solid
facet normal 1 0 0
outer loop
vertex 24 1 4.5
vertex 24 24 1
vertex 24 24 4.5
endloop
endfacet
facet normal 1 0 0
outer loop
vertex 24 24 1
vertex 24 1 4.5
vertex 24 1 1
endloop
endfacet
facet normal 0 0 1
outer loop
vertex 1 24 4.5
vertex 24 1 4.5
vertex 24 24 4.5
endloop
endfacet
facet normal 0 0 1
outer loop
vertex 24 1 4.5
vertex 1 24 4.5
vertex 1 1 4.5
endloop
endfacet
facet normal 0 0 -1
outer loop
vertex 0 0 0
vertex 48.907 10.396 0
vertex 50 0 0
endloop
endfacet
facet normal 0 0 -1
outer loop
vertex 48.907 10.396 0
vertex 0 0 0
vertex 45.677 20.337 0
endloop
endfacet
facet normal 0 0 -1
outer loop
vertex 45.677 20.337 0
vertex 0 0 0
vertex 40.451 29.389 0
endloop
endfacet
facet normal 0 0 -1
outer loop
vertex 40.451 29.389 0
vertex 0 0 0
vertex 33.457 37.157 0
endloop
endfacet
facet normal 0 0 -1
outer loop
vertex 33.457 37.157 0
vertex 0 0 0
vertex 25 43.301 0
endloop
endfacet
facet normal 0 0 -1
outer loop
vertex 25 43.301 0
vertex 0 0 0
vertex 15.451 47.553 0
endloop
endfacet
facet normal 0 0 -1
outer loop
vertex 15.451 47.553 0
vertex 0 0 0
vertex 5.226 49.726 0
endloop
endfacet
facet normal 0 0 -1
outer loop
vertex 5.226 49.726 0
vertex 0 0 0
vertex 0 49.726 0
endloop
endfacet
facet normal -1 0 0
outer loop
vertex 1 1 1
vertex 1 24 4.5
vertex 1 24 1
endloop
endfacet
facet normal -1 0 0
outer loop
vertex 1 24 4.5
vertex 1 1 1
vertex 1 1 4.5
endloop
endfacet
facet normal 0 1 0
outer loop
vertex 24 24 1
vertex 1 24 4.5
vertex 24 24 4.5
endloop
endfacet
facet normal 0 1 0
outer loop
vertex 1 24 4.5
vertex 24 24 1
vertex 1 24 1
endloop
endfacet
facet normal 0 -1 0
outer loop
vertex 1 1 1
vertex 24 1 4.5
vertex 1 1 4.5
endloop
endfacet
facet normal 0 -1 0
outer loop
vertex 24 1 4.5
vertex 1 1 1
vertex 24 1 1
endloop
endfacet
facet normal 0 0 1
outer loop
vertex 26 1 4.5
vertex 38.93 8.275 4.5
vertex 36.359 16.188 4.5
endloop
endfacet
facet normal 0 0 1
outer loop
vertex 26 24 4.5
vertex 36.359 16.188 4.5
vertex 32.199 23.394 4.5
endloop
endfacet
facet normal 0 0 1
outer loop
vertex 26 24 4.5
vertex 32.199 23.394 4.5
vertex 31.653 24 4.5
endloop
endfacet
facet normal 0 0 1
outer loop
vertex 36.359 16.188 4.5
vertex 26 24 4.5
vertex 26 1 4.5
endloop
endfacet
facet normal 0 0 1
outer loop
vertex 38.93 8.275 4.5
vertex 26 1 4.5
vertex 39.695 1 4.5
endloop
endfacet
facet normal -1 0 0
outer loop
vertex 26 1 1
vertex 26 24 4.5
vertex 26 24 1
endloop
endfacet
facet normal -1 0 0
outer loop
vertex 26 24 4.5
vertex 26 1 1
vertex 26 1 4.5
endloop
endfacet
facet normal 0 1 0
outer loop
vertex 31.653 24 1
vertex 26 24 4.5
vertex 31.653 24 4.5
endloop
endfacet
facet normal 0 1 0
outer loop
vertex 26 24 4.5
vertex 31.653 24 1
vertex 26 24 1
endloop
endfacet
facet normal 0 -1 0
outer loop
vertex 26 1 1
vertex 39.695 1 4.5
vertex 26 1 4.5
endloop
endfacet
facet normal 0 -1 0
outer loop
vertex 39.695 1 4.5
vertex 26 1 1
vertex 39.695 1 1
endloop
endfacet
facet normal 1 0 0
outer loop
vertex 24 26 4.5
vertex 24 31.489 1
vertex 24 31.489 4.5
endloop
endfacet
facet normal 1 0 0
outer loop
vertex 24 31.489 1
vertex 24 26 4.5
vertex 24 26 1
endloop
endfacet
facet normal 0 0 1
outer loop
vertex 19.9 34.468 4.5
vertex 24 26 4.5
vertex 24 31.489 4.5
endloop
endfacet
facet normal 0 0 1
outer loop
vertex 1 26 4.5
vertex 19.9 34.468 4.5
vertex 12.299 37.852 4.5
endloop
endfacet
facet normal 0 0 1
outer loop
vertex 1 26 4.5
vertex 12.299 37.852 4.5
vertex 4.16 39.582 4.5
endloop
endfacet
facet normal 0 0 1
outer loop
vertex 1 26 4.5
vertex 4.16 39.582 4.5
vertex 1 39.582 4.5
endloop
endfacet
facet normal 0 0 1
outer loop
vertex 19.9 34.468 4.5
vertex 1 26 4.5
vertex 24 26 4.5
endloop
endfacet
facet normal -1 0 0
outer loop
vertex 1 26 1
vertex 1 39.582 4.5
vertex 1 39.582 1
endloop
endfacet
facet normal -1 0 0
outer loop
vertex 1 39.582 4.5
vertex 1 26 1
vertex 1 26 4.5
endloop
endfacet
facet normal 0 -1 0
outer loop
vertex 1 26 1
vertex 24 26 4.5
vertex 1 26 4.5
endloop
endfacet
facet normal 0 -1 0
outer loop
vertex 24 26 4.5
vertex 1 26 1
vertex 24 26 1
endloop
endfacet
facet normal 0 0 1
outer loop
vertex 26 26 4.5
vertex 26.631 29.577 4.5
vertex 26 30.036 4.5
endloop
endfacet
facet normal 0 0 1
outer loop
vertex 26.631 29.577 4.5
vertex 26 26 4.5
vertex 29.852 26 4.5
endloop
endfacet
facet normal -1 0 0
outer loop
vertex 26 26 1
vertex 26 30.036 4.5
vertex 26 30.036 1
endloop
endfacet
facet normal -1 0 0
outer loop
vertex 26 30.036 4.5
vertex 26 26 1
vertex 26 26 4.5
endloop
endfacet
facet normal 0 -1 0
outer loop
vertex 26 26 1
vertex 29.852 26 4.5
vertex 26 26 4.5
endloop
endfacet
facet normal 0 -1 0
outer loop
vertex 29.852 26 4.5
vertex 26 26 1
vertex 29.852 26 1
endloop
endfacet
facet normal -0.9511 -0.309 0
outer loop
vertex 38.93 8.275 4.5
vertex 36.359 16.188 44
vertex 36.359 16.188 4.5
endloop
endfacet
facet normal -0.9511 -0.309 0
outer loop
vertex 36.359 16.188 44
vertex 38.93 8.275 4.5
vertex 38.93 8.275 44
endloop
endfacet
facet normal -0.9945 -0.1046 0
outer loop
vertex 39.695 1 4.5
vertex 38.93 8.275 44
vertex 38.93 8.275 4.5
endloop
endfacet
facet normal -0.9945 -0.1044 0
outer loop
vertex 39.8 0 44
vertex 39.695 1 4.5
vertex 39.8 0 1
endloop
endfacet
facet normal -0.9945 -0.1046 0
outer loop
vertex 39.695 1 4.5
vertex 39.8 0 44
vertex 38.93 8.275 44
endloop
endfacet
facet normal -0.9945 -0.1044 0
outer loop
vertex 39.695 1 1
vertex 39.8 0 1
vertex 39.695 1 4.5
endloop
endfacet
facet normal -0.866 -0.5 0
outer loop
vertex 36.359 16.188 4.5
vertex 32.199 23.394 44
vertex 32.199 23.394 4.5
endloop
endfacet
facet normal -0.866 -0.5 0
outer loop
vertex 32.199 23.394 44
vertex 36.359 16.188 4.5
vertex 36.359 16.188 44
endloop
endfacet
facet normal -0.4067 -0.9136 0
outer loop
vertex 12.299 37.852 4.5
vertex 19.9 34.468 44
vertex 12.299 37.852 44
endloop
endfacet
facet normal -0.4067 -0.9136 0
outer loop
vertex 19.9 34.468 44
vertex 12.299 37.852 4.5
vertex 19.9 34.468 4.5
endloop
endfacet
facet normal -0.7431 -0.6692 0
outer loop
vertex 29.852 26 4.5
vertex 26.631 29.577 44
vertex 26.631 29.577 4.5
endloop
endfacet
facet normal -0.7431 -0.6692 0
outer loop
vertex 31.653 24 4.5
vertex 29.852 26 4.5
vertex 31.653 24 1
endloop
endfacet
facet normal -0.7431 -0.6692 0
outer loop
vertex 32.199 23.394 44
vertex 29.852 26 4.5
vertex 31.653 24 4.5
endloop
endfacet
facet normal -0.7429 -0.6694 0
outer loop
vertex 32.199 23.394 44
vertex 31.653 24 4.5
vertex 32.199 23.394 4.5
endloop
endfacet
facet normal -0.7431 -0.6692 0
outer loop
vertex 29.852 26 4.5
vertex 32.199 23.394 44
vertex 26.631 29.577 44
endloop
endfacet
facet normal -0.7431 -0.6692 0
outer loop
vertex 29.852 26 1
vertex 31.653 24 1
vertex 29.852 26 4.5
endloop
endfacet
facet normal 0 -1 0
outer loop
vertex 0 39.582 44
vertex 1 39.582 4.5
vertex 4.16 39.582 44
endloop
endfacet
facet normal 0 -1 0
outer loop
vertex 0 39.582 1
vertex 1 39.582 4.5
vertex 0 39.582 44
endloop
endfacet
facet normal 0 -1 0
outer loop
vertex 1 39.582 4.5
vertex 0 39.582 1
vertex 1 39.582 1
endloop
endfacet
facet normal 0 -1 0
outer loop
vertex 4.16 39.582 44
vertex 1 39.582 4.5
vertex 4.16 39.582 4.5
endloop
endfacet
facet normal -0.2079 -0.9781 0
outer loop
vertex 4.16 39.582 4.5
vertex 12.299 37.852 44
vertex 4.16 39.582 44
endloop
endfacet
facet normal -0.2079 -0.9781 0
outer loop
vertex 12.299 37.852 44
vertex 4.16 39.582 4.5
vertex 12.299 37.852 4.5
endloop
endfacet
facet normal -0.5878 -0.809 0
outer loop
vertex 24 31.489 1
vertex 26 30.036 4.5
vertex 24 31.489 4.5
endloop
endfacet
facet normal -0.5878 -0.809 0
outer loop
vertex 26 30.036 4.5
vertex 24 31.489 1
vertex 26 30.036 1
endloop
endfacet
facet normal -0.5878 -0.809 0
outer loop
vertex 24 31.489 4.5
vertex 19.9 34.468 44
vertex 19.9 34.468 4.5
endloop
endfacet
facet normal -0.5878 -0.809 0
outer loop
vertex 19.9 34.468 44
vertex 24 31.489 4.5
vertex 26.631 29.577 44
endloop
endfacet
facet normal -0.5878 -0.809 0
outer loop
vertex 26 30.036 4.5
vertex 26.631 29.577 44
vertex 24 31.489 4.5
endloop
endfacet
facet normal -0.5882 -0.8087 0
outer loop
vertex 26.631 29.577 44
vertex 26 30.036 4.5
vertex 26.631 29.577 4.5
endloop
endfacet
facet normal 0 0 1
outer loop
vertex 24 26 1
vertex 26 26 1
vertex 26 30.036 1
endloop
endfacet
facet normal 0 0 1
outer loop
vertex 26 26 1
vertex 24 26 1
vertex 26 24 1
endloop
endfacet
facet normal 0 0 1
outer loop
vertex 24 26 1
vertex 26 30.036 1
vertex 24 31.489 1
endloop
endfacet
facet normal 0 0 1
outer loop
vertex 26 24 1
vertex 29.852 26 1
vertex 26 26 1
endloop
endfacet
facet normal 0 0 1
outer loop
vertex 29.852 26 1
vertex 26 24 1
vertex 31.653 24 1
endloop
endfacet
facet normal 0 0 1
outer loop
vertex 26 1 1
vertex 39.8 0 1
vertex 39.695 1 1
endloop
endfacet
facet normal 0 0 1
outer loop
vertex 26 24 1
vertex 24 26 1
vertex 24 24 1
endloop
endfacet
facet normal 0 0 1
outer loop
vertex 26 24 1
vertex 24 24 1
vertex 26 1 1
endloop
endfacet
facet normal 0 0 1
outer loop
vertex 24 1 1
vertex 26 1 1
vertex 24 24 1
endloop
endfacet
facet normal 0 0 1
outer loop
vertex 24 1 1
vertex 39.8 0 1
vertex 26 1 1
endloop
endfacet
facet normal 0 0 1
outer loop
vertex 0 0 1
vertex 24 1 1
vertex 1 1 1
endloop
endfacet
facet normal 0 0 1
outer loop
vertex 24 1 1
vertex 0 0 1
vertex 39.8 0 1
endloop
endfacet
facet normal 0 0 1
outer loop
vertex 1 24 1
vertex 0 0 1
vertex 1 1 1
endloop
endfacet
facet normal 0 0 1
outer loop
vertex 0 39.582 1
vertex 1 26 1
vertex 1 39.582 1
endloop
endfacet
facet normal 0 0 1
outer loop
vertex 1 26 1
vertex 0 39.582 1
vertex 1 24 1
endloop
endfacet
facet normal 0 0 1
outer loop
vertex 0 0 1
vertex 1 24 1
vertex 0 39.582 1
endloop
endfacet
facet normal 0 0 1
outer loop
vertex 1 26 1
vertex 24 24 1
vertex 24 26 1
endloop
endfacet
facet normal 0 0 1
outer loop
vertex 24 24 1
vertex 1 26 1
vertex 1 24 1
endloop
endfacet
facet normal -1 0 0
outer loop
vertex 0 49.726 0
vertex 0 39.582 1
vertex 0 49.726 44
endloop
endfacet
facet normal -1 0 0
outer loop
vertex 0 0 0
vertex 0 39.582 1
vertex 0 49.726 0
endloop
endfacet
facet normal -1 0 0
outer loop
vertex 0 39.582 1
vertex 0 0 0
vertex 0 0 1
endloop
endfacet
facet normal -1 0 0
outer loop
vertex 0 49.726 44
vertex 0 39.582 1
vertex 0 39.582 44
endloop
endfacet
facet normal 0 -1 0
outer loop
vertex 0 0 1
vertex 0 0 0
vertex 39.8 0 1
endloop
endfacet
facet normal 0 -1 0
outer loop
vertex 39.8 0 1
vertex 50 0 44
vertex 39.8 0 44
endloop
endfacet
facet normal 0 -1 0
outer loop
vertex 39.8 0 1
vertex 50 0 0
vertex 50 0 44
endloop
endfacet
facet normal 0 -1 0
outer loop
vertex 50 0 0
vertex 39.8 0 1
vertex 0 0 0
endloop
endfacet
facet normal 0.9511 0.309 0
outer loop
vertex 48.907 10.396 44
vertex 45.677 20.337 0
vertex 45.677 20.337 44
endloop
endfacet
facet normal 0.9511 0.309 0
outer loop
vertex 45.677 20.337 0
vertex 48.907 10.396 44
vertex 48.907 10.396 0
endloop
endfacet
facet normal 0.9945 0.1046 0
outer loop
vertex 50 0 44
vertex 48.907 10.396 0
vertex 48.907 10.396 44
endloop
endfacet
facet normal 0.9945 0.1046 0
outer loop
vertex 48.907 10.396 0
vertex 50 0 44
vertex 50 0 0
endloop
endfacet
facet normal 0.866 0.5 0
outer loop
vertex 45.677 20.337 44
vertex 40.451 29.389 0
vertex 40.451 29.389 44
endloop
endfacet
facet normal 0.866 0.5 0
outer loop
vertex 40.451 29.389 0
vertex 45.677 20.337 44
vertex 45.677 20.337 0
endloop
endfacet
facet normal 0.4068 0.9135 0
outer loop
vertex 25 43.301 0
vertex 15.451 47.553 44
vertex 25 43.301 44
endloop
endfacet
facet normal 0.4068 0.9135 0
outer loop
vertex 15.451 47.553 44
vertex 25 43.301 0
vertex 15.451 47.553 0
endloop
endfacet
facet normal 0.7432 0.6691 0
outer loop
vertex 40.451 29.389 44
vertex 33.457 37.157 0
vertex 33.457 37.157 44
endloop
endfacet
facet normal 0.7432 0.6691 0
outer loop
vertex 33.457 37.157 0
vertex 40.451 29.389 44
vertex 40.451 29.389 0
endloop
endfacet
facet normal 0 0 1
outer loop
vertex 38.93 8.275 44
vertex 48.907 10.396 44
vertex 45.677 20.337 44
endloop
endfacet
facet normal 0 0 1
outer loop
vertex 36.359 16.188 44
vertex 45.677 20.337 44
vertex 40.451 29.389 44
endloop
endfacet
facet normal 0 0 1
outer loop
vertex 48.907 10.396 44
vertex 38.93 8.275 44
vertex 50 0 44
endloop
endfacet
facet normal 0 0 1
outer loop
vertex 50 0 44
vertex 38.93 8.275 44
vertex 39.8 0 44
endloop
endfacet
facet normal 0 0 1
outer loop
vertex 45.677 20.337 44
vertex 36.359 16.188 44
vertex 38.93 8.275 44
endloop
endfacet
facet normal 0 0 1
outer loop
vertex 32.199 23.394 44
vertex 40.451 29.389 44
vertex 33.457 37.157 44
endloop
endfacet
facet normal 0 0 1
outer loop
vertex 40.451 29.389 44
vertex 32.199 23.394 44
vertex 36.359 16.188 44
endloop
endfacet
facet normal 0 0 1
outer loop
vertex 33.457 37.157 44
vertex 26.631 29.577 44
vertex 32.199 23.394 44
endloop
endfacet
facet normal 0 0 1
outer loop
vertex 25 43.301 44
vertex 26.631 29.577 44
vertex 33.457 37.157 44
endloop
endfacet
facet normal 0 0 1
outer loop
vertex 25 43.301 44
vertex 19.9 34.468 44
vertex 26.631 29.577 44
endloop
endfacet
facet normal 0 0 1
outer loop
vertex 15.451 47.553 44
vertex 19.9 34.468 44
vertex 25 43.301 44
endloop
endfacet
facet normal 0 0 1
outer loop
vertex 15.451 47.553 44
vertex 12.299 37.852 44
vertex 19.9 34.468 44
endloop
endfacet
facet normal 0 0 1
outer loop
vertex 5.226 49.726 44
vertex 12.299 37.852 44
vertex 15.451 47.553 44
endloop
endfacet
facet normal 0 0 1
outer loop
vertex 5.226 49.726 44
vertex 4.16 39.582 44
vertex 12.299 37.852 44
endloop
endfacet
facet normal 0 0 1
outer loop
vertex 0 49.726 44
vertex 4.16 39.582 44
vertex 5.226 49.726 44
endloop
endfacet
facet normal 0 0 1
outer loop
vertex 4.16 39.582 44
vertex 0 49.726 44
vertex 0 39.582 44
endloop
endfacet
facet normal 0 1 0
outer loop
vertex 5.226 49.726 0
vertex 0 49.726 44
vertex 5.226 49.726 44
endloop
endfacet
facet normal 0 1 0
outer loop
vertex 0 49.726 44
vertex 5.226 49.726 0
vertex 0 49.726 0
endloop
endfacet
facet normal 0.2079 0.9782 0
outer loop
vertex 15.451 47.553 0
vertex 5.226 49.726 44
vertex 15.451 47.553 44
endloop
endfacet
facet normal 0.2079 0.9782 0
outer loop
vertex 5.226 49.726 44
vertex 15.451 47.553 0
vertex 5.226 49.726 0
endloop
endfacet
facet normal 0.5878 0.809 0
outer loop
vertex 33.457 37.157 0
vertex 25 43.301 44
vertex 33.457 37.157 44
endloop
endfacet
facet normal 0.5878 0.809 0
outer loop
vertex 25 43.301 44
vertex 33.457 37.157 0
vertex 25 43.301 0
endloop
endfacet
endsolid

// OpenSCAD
//translate([0,0,0]) color("LightGray") square([25,25],false);
//translate([25,0,0]) color("LightGray") square([25,25],false);
//translate([0,25,0]) color("LightGray") square([25,25],false);
//translate([25,25,0]) color("LightGray") square([25,25],false);

scale([2,2,2]) {
    //translate([0,50,0]) color("Gray") square([50,12.5],false);
    //translate([50,0,0]) color("Gray") square([12.5,50],false);
}

color("LightGray") {
    intersection () {
        union() {
            translate([1,1,0]) cube([23,23,4.5]);
            translate([25+1,1,0]) cube([23,23,4.5]);
            translate([1,25+1,0]) cube([23,23,4.5]);
            translate([25+1,25+1,0]) cube([23,23,4.5]);
        }
        cylinder(50,50-10.2,50-10.2);
    }
}
color("Grey") {
    intersection() {
        cube([50,50,1]);
        cylinder(50,50-10.2,50-10.2);
    }
    intersection() {
        difference() {
            cylinder(50-6,50,50);
            cylinder(50,50-10.2,50-10.2);
        }
        cube([50,50,50]);
    }
}
